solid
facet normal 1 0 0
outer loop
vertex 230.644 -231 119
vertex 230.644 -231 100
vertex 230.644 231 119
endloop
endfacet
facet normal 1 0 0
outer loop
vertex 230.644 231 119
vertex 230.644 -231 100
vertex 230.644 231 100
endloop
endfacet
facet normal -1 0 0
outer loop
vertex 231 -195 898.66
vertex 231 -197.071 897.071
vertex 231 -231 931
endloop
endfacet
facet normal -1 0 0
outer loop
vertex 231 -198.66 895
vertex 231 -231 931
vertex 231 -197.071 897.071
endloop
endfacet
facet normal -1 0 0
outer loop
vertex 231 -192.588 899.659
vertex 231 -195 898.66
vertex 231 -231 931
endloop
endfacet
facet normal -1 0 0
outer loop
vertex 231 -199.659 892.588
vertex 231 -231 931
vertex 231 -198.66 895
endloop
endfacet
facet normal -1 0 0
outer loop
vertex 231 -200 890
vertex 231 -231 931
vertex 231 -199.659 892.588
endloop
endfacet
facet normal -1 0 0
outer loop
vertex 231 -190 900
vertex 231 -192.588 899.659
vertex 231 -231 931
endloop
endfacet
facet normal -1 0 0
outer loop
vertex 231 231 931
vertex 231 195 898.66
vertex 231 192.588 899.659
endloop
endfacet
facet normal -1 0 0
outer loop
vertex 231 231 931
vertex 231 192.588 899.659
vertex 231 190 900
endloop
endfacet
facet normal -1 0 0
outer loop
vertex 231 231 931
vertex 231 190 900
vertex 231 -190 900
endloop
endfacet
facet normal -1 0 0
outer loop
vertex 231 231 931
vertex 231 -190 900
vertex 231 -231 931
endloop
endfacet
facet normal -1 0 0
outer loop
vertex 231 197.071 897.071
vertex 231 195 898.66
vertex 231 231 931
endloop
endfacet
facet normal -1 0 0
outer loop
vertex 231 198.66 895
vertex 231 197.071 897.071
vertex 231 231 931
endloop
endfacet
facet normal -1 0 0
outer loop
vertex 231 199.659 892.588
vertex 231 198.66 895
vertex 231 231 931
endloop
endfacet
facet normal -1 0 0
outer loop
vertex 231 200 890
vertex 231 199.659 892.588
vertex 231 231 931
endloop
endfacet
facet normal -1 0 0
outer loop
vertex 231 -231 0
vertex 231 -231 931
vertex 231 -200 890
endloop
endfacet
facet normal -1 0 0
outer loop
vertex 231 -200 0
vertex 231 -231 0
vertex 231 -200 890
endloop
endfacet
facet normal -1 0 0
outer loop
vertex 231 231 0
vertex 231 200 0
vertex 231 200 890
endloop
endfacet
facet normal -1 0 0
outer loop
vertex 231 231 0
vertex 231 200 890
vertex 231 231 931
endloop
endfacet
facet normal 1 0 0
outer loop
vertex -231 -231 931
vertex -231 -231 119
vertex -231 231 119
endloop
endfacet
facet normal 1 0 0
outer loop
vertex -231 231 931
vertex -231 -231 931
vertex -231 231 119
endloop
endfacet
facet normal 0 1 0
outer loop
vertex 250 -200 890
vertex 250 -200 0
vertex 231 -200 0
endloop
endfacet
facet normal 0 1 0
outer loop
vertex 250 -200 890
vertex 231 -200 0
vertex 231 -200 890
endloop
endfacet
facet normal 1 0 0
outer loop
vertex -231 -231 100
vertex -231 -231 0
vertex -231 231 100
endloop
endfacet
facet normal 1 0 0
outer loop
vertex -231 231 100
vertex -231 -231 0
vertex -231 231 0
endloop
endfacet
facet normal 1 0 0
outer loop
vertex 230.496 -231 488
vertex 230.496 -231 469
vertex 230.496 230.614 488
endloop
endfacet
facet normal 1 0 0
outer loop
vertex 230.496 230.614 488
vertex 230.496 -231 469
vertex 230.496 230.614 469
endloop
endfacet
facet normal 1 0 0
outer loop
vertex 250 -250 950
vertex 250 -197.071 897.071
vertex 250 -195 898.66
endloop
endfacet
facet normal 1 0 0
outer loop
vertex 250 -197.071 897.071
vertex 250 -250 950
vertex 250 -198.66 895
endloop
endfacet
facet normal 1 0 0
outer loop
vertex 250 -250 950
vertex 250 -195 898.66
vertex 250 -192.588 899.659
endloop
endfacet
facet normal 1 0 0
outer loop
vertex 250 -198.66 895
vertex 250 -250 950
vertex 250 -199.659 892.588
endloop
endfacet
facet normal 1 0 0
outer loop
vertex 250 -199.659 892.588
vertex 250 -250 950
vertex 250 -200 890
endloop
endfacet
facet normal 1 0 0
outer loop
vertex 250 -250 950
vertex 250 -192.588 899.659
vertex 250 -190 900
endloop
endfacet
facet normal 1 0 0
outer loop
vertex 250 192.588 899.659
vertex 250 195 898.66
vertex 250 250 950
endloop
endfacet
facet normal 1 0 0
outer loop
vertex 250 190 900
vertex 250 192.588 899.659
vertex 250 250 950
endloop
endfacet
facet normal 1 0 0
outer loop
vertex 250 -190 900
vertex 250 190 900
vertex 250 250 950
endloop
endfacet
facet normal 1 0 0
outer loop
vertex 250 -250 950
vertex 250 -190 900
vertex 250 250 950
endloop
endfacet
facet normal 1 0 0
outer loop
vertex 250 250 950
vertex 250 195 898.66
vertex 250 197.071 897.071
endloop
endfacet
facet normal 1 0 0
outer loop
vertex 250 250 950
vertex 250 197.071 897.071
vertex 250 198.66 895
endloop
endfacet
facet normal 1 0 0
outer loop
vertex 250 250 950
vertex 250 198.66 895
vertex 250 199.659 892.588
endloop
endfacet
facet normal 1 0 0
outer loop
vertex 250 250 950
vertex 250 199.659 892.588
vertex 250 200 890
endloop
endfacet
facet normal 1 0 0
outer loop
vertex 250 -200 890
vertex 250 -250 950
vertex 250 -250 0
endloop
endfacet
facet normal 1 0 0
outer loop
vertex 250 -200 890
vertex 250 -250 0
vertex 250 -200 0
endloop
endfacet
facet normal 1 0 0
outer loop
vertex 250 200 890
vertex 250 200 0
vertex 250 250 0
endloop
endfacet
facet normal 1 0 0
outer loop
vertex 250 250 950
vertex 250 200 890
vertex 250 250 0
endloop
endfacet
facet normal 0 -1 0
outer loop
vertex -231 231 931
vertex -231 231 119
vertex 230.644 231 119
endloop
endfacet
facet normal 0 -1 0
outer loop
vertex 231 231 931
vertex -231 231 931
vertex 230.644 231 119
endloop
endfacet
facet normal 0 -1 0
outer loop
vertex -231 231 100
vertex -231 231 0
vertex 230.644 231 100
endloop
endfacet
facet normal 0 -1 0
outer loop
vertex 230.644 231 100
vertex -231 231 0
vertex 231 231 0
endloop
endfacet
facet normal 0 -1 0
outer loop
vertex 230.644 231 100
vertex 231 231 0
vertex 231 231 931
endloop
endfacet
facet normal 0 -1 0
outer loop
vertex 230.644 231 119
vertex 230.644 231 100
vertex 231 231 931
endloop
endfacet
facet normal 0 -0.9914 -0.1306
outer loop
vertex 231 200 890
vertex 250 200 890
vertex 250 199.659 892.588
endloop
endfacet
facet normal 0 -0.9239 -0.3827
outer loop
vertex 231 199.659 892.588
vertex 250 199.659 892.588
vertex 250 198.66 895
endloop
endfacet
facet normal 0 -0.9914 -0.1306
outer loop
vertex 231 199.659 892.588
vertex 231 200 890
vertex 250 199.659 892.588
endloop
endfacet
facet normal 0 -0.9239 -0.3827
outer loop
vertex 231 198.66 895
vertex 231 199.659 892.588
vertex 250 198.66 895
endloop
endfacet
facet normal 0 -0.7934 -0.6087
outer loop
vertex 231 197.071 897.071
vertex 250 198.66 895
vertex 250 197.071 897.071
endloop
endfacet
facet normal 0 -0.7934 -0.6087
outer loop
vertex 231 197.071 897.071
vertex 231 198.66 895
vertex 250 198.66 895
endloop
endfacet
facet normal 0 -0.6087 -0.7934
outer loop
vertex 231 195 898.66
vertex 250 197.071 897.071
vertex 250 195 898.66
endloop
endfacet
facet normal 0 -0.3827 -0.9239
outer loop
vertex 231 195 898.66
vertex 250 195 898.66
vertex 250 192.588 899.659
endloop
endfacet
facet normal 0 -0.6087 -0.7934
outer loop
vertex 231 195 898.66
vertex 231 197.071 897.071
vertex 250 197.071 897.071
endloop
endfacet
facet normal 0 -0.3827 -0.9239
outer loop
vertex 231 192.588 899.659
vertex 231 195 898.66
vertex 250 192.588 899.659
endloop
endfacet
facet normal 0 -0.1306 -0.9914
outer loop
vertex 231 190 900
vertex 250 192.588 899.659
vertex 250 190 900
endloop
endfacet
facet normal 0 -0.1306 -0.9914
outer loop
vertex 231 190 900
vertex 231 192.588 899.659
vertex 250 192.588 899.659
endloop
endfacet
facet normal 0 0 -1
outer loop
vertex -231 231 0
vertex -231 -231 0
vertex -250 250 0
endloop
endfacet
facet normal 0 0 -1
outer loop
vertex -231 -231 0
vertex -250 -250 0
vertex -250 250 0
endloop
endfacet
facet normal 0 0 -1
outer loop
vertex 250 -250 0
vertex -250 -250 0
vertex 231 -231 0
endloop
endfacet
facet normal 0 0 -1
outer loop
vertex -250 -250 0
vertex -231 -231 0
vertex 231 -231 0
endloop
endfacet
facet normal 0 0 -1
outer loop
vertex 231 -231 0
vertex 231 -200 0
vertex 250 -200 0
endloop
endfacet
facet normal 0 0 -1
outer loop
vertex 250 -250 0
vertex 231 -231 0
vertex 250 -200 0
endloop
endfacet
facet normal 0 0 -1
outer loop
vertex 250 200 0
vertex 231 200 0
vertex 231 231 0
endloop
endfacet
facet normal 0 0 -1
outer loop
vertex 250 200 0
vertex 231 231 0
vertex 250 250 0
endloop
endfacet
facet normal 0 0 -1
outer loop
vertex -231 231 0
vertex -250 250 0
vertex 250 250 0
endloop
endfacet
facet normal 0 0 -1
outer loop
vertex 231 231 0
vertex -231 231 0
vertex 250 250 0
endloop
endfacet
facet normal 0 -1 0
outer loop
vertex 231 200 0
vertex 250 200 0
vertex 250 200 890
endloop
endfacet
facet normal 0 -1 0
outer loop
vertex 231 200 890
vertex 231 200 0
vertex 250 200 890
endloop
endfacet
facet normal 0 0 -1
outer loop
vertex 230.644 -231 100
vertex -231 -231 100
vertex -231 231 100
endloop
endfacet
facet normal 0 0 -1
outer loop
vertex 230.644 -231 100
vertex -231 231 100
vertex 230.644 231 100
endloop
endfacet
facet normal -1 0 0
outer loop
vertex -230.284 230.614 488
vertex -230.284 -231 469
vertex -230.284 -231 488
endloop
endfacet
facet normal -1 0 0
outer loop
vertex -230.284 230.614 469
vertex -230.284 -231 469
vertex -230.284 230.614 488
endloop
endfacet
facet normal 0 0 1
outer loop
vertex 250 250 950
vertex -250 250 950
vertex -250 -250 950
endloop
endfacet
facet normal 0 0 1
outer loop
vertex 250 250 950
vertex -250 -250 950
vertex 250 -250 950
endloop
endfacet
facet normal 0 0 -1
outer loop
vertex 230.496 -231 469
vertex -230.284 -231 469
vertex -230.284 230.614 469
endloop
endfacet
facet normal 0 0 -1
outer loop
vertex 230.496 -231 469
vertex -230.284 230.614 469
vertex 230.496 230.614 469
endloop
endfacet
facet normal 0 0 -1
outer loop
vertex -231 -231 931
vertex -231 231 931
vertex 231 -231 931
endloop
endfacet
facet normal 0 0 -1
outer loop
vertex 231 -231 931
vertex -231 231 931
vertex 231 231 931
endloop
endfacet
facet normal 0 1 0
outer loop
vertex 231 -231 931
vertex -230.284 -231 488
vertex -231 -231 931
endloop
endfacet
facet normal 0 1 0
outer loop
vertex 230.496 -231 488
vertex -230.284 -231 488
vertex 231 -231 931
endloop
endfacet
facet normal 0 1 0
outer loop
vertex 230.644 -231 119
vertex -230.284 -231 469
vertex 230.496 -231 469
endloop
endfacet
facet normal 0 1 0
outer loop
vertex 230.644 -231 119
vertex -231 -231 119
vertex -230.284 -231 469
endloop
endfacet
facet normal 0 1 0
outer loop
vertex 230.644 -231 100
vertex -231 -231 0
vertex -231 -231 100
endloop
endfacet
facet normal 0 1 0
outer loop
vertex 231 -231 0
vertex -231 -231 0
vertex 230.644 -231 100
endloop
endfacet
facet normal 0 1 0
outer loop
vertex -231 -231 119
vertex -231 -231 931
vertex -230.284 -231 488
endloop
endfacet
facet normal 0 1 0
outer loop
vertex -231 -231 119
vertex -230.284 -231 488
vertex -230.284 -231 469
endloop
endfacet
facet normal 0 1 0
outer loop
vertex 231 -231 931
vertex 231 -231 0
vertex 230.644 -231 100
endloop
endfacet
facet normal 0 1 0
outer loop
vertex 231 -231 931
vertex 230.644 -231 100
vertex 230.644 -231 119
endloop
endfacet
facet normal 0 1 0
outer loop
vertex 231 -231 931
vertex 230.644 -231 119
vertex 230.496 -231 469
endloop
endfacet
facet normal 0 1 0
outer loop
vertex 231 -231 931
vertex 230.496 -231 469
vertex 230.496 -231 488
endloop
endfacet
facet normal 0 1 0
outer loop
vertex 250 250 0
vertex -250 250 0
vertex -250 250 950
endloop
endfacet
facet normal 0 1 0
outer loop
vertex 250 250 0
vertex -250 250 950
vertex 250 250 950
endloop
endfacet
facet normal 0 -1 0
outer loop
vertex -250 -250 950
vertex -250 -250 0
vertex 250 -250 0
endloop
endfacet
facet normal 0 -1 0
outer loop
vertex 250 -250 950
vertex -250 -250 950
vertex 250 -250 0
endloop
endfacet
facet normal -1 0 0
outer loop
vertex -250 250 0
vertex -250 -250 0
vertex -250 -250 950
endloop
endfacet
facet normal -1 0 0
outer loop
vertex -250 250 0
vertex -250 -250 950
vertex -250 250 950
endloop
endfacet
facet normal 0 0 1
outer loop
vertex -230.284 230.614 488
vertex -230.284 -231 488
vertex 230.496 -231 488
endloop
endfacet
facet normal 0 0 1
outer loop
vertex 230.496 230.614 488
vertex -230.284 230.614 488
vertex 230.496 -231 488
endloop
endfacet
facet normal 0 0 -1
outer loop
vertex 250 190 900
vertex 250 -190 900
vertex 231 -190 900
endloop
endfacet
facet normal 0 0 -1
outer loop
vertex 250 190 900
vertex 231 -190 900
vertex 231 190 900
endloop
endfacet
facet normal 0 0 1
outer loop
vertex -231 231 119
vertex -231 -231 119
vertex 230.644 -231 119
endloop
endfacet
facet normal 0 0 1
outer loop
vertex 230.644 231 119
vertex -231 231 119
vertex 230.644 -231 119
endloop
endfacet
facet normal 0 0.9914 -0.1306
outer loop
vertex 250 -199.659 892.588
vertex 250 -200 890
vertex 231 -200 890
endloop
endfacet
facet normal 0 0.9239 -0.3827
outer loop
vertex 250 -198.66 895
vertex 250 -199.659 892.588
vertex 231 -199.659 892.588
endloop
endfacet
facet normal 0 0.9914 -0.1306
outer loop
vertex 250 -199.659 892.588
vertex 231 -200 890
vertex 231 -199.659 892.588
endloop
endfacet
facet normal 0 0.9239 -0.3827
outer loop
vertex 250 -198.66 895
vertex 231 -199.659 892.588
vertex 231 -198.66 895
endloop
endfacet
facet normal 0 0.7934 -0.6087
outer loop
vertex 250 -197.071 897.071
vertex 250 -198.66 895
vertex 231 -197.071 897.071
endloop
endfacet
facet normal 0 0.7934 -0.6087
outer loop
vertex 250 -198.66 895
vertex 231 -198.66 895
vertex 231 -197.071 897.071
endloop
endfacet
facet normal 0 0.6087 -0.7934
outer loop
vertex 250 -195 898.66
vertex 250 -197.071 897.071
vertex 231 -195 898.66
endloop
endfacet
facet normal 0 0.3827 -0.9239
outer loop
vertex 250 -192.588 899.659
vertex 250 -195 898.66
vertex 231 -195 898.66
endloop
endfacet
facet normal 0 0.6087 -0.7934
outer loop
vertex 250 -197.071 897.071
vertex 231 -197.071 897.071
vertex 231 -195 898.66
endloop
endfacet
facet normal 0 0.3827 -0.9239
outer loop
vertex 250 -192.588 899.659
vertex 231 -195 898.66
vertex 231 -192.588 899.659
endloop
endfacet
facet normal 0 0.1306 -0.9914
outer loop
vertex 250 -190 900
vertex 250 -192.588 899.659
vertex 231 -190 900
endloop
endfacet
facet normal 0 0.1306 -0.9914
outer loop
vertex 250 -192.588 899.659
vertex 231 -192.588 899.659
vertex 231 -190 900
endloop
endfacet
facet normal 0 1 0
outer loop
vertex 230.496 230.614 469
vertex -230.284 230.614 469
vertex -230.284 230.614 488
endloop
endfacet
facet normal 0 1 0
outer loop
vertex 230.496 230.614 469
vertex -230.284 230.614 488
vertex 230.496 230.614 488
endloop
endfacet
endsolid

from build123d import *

# Parameters (mm, degrees)
F0_W      = 500
F0_H      = 500
F1_DEPTH  = 950
F2_T      = -19
F3_W      = 400
F3_H      = 900
F4_DEPTH  = 25
F5_R      = 10
F7_W      = 461.7021232843
F7_H      = 462.5295698643
F8_DEPTH  = 19
F10_W     = 460.7798308134
F10_H     = 461.6745561361
F11_DEPTH = 19


with BuildPart() as f1:
    # F0 (on Top) → F1 (new body)
    with BuildSketch(Plane.XY):
        Rectangle(F0_W, F0_H)
    extrude(amount=F1_DEPTH)

    # F2
    f2_openings = [f1.faces().sort_by_distance(p)[0] for p in [
        (0, 0, 0),
    ]]
    offset(amount=F2_T, openings=f2_openings)

    # F3 (on face) → F4 (cut)
    with BuildSketch(Plane.YZ.offset(250)):
        with Locations((0, 450)):
            Rectangle(F3_W, F3_H)
    extrude(amount=-F4_DEPTH, mode=Mode.SUBTRACT)

    # F5
    f5_edges = [f1.edges().sort_by_distance(p)[0] for p in [
        (240.5, 200, 900),
        (240.5, -200, 900),
    ]]
    fillet(f5_edges, radius=F5_R)

    # F7 (on offset) → F8 (join)
    with BuildSketch(Plane.XY.offset(100)):
        with Locations((-0.2068504691, 0.2068579197)):
            Rectangle(F7_W, F7_H)
    extrude(amount=F8_DEPTH)

    # F10 (on offset) → F11 (join)
    with BuildSketch(Plane.XY.offset(469)):
        with Locations((0.1056715846, -0.2236738801)):
            Rectangle(F10_W, F10_H)
    extrude(amount=F11_DEPTH)


solid = f1.part
